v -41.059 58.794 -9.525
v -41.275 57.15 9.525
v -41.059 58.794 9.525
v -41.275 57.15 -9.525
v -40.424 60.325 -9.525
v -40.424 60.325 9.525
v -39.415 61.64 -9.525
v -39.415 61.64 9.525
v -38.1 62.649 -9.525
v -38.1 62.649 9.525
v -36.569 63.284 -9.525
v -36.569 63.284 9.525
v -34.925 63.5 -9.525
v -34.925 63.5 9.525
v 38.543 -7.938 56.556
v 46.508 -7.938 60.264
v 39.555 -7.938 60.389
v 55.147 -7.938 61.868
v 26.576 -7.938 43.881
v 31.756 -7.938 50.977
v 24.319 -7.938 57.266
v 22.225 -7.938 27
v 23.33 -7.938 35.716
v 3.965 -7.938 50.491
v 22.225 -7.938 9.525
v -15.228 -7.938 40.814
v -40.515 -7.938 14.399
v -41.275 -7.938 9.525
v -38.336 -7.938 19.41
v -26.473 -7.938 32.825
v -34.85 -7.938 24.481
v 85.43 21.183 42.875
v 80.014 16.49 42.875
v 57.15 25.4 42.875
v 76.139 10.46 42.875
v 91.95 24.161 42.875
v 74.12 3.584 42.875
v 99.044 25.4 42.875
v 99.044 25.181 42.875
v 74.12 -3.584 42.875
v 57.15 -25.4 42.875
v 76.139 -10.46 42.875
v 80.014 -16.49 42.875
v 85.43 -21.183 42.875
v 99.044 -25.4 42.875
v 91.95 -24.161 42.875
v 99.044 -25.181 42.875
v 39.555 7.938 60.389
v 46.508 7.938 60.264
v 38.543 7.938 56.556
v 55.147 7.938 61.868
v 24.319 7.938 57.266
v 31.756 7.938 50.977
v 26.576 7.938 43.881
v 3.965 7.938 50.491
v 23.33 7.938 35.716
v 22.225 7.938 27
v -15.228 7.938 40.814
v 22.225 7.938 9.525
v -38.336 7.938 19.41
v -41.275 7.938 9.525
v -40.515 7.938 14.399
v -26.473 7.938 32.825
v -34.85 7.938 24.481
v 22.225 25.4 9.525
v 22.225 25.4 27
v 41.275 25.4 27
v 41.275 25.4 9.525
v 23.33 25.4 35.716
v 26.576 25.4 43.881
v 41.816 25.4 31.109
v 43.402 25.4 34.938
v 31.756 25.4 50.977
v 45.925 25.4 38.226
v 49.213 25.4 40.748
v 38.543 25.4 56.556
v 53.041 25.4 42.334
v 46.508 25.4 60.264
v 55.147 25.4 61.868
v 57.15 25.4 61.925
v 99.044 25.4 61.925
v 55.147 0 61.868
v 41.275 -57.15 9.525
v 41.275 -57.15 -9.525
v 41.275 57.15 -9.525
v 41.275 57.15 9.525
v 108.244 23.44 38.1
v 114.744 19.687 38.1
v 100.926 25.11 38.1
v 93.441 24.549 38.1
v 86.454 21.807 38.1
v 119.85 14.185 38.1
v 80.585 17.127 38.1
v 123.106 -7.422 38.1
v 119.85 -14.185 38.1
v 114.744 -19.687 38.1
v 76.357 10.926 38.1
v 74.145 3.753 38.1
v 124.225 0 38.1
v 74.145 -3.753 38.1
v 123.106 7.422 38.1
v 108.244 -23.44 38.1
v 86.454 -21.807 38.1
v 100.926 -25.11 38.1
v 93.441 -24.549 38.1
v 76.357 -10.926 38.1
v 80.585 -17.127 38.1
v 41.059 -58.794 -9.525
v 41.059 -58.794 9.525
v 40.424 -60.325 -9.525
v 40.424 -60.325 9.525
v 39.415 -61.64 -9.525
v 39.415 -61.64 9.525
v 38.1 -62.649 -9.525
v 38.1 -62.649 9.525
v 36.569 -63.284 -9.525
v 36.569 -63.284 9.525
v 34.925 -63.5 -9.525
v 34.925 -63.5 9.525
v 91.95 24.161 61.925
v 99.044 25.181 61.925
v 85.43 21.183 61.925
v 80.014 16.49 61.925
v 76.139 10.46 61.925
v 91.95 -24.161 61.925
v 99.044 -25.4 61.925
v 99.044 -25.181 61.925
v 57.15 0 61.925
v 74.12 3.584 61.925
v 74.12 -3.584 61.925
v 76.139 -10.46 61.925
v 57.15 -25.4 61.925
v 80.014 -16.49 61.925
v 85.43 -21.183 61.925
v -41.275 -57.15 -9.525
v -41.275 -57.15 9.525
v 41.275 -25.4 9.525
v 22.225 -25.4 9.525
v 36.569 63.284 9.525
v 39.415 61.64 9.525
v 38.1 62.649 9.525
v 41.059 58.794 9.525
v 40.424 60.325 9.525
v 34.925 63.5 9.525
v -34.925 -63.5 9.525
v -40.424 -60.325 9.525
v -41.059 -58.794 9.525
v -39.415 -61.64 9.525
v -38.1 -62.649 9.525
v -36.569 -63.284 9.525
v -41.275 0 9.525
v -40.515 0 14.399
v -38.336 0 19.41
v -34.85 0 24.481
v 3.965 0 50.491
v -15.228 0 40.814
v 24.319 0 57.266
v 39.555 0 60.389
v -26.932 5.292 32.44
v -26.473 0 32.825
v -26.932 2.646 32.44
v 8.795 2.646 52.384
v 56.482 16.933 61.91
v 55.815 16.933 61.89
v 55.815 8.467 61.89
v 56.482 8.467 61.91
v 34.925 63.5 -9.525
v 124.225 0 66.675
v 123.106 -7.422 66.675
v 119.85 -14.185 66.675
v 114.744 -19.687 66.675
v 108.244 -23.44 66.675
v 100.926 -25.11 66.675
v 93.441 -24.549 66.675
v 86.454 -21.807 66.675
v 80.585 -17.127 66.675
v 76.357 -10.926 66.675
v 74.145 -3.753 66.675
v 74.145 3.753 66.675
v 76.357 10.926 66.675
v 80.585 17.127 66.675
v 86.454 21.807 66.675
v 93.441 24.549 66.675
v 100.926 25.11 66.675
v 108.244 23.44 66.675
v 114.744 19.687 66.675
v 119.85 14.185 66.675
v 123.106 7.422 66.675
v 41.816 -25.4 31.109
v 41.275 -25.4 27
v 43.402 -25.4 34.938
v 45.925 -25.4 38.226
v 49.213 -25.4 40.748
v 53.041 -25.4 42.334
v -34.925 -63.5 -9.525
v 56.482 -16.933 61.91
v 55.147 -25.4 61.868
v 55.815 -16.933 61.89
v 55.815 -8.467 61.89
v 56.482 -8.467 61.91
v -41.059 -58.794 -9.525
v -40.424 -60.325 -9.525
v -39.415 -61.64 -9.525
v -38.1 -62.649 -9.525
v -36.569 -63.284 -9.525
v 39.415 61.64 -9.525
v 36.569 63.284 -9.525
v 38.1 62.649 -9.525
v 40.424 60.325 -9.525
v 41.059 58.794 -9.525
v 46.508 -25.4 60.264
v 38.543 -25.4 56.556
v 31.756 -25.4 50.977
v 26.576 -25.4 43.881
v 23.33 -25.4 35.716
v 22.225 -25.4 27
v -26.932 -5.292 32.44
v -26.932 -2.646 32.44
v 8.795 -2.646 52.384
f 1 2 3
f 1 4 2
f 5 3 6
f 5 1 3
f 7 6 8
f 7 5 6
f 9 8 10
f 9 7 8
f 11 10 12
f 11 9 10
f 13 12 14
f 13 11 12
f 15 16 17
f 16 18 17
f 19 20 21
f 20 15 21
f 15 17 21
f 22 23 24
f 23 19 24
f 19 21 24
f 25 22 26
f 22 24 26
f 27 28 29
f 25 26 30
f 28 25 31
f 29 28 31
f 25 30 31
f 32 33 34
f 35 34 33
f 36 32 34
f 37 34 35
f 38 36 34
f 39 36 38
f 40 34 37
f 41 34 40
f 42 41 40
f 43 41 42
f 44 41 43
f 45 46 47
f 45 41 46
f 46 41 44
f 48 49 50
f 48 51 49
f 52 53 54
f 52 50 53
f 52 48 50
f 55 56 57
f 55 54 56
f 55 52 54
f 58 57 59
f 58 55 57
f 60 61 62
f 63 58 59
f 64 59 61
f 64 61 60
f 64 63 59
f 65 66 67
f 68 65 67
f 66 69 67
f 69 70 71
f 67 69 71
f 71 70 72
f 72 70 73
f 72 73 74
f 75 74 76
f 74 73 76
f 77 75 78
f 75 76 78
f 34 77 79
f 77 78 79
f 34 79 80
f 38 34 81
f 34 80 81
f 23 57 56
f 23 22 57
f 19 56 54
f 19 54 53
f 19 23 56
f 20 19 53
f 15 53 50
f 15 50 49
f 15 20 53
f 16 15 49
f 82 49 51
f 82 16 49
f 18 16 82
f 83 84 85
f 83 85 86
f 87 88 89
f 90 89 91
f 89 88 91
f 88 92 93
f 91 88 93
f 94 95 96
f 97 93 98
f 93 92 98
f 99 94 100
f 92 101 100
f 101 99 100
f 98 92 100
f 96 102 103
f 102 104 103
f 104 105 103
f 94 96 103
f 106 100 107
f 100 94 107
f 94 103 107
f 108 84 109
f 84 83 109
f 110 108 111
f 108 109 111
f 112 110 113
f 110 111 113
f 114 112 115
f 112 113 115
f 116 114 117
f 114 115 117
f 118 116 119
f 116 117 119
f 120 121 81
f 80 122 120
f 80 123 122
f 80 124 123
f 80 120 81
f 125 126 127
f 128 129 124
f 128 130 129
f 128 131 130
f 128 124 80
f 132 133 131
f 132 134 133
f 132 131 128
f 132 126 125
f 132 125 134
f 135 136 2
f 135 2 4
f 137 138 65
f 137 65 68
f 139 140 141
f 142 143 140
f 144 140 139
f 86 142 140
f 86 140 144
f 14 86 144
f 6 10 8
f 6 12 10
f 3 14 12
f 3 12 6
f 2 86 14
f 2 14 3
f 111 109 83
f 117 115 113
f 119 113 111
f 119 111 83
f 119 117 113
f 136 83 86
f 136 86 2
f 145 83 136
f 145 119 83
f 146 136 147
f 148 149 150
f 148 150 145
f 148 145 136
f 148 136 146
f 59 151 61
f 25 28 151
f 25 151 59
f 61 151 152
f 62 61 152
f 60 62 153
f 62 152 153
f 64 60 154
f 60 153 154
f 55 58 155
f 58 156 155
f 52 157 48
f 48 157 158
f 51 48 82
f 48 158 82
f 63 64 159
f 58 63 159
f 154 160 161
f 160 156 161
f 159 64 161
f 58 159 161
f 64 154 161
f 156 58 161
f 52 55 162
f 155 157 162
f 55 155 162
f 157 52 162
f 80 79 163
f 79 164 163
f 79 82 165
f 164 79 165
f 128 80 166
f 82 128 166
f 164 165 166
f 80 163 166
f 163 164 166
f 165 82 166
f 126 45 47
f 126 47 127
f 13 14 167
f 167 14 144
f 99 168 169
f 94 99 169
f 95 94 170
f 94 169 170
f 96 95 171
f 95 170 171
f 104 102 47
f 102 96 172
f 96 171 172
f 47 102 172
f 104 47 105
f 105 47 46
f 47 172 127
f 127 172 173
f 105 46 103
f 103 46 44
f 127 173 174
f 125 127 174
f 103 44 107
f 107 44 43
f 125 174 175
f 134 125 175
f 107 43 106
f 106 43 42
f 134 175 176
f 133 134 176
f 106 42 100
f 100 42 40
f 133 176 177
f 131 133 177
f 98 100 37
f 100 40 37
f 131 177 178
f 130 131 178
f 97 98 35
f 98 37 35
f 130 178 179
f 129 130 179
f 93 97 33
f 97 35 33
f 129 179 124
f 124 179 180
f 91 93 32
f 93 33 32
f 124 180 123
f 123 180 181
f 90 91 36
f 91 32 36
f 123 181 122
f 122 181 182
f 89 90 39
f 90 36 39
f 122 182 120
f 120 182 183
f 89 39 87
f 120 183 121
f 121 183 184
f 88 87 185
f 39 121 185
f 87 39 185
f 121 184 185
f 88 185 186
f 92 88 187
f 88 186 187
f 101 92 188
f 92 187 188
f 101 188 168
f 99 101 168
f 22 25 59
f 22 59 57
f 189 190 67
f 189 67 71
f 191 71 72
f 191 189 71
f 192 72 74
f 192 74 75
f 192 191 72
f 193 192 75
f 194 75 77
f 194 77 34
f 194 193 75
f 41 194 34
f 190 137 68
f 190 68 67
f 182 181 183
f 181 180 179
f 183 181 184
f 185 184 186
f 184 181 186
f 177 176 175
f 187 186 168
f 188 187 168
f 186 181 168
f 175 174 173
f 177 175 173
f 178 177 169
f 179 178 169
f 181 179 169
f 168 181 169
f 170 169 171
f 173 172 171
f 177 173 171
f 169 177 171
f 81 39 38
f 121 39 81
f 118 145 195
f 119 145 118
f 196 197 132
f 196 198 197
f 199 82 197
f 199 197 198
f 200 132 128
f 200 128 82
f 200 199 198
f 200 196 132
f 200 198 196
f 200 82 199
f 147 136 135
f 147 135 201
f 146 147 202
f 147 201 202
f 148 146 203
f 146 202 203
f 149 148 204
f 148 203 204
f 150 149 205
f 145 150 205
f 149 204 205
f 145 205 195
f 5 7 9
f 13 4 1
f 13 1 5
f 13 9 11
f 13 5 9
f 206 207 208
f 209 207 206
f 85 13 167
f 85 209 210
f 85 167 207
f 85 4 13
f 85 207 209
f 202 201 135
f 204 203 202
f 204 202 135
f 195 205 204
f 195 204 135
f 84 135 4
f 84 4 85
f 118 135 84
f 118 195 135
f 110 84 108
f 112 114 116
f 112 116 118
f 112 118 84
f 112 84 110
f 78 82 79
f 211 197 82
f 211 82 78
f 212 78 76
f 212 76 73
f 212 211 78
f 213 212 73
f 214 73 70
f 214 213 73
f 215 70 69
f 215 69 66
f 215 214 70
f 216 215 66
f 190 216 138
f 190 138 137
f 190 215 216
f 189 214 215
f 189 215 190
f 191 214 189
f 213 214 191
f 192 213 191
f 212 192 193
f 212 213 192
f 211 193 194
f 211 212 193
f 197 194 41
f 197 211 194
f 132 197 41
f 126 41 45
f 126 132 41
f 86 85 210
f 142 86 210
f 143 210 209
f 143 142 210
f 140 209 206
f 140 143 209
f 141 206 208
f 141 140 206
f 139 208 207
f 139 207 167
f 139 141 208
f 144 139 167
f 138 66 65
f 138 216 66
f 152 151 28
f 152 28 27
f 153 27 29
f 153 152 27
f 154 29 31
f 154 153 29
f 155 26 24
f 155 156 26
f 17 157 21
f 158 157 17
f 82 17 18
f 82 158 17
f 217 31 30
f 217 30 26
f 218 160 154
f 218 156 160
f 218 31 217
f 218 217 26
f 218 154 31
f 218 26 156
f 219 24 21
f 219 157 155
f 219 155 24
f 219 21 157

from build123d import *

# Parameters (mm, degrees)
F1_DEPTH = 63.5
F0_W     = 25.6192001271
F0_H     = 19.05
F2_DEPTH = 25.4
F3_DEPTH = 7.9375
F5_R     = 6.35


with BuildPart() as f1:
    # F0 (on Front) → F1 (new body, symmetric)
    with BuildSketch(Plane.XZ):
        Polygon((22.225, 9.525), (-41.275, 9.525), (-41.275, -9.525), (41.275, -9.525), (41.275, 9.525), align=None)
    extrude(amount=F1_DEPTH, both=True)

    # F5
    f5_edges = [f1.edges().sort_by_distance(p)[0] for p in [
        (-41.275, -63.5, 0),
        (41.275, -63.5, 0),
        (41.275, 63.5, 0),
        (-41.275, 63.5, 0),
    ]]
    fillet(f5_edges, radius=F5_R)


with BuildPart() as f2:
    # F0 (on Front) → F2 (new body, symmetric)
    with BuildSketch(Plane.XZ):
        with BuildLine():
            Line((22.225, 27.0002), (22.225, 9.525))
            Line((22.225, 9.525), (41.275, 9.525))
            Line((41.275, 9.525), (41.275, 27.0002))
            ThreePointArc((41.275, 27.0002), (45.9246798487, 38.2255201513), (57.15, 42.8752))
            Line((57.15, 42.8752), (73.4250409278, 42.8752))
            Line((73.4250409278, 42.8752), (73.4250409278, 61.9252))
            Line((73.4250409278, 61.9252), (57.15, 61.9252))
            add(Edge.make_bspline(
                [(55.1467635133, 61.8677016108), (55.8145914565, 61.8920933815), (56.4823802106, 61.9112896237), (57.15, 61.9252)],
                knots=[109.9768834812, 109.9768834812, 109.9768834812, 109.9768834812, 111.5045361635, 111.5045361635, 111.5045361635, 111.5045361635], degree=3))
            ThreePointArc((55.1467635133, 61.8677016108), (31.7559193974, 50.9771951276), (22.225, 27.0002))
        make_face()
        with Locations((86.2346409914, 52.4002)):
            Rectangle(F0_W, F0_H)
    extrude(amount=F2_DEPTH, both=True)

    # F0 (on Front) → F4 (revolve)
    with BuildSketch(Plane.XZ):
        Polygon((99.044241055, 66.675), (99.044241055, 61.9252), (99.044241055, 42.8752), (99.044241055, 38.1), (124.2250409278, 38.1), (124.2250409278, 66.675), align=None)
    revolve(axis=Axis((99.044241055, 0, 52.3875), (0, 0, -1)))


with BuildPart() as f3:
    # F0 (on Front) → F3 (new body, symmetric)
    with BuildSketch(Plane.XZ):
        with BuildLine():
            add(Edge.make_bspline(
                [(-41.275, 9.525), (-41.211228034, 31.429027723), (7.0693197697, 60.1117194089), (55.1467635133, 61.8677016108)],
                knots=[0, 0, 0, 0, 109.9768834812, 109.9768834812, 109.9768834812, 109.9768834812], degree=3))
            Line((-41.275, 9.525), (22.225, 9.525))
            Line((22.225, 9.525), (22.225, 27.0002))
            ThreePointArc((22.225, 27.0002), (31.7559193974, 50.9771951276), (55.1467635133, 61.8677016108))
        make_face()
    extrude(amount=F3_DEPTH, both=True)


solid = Compound([f1.part, f2.part, f3.part])
